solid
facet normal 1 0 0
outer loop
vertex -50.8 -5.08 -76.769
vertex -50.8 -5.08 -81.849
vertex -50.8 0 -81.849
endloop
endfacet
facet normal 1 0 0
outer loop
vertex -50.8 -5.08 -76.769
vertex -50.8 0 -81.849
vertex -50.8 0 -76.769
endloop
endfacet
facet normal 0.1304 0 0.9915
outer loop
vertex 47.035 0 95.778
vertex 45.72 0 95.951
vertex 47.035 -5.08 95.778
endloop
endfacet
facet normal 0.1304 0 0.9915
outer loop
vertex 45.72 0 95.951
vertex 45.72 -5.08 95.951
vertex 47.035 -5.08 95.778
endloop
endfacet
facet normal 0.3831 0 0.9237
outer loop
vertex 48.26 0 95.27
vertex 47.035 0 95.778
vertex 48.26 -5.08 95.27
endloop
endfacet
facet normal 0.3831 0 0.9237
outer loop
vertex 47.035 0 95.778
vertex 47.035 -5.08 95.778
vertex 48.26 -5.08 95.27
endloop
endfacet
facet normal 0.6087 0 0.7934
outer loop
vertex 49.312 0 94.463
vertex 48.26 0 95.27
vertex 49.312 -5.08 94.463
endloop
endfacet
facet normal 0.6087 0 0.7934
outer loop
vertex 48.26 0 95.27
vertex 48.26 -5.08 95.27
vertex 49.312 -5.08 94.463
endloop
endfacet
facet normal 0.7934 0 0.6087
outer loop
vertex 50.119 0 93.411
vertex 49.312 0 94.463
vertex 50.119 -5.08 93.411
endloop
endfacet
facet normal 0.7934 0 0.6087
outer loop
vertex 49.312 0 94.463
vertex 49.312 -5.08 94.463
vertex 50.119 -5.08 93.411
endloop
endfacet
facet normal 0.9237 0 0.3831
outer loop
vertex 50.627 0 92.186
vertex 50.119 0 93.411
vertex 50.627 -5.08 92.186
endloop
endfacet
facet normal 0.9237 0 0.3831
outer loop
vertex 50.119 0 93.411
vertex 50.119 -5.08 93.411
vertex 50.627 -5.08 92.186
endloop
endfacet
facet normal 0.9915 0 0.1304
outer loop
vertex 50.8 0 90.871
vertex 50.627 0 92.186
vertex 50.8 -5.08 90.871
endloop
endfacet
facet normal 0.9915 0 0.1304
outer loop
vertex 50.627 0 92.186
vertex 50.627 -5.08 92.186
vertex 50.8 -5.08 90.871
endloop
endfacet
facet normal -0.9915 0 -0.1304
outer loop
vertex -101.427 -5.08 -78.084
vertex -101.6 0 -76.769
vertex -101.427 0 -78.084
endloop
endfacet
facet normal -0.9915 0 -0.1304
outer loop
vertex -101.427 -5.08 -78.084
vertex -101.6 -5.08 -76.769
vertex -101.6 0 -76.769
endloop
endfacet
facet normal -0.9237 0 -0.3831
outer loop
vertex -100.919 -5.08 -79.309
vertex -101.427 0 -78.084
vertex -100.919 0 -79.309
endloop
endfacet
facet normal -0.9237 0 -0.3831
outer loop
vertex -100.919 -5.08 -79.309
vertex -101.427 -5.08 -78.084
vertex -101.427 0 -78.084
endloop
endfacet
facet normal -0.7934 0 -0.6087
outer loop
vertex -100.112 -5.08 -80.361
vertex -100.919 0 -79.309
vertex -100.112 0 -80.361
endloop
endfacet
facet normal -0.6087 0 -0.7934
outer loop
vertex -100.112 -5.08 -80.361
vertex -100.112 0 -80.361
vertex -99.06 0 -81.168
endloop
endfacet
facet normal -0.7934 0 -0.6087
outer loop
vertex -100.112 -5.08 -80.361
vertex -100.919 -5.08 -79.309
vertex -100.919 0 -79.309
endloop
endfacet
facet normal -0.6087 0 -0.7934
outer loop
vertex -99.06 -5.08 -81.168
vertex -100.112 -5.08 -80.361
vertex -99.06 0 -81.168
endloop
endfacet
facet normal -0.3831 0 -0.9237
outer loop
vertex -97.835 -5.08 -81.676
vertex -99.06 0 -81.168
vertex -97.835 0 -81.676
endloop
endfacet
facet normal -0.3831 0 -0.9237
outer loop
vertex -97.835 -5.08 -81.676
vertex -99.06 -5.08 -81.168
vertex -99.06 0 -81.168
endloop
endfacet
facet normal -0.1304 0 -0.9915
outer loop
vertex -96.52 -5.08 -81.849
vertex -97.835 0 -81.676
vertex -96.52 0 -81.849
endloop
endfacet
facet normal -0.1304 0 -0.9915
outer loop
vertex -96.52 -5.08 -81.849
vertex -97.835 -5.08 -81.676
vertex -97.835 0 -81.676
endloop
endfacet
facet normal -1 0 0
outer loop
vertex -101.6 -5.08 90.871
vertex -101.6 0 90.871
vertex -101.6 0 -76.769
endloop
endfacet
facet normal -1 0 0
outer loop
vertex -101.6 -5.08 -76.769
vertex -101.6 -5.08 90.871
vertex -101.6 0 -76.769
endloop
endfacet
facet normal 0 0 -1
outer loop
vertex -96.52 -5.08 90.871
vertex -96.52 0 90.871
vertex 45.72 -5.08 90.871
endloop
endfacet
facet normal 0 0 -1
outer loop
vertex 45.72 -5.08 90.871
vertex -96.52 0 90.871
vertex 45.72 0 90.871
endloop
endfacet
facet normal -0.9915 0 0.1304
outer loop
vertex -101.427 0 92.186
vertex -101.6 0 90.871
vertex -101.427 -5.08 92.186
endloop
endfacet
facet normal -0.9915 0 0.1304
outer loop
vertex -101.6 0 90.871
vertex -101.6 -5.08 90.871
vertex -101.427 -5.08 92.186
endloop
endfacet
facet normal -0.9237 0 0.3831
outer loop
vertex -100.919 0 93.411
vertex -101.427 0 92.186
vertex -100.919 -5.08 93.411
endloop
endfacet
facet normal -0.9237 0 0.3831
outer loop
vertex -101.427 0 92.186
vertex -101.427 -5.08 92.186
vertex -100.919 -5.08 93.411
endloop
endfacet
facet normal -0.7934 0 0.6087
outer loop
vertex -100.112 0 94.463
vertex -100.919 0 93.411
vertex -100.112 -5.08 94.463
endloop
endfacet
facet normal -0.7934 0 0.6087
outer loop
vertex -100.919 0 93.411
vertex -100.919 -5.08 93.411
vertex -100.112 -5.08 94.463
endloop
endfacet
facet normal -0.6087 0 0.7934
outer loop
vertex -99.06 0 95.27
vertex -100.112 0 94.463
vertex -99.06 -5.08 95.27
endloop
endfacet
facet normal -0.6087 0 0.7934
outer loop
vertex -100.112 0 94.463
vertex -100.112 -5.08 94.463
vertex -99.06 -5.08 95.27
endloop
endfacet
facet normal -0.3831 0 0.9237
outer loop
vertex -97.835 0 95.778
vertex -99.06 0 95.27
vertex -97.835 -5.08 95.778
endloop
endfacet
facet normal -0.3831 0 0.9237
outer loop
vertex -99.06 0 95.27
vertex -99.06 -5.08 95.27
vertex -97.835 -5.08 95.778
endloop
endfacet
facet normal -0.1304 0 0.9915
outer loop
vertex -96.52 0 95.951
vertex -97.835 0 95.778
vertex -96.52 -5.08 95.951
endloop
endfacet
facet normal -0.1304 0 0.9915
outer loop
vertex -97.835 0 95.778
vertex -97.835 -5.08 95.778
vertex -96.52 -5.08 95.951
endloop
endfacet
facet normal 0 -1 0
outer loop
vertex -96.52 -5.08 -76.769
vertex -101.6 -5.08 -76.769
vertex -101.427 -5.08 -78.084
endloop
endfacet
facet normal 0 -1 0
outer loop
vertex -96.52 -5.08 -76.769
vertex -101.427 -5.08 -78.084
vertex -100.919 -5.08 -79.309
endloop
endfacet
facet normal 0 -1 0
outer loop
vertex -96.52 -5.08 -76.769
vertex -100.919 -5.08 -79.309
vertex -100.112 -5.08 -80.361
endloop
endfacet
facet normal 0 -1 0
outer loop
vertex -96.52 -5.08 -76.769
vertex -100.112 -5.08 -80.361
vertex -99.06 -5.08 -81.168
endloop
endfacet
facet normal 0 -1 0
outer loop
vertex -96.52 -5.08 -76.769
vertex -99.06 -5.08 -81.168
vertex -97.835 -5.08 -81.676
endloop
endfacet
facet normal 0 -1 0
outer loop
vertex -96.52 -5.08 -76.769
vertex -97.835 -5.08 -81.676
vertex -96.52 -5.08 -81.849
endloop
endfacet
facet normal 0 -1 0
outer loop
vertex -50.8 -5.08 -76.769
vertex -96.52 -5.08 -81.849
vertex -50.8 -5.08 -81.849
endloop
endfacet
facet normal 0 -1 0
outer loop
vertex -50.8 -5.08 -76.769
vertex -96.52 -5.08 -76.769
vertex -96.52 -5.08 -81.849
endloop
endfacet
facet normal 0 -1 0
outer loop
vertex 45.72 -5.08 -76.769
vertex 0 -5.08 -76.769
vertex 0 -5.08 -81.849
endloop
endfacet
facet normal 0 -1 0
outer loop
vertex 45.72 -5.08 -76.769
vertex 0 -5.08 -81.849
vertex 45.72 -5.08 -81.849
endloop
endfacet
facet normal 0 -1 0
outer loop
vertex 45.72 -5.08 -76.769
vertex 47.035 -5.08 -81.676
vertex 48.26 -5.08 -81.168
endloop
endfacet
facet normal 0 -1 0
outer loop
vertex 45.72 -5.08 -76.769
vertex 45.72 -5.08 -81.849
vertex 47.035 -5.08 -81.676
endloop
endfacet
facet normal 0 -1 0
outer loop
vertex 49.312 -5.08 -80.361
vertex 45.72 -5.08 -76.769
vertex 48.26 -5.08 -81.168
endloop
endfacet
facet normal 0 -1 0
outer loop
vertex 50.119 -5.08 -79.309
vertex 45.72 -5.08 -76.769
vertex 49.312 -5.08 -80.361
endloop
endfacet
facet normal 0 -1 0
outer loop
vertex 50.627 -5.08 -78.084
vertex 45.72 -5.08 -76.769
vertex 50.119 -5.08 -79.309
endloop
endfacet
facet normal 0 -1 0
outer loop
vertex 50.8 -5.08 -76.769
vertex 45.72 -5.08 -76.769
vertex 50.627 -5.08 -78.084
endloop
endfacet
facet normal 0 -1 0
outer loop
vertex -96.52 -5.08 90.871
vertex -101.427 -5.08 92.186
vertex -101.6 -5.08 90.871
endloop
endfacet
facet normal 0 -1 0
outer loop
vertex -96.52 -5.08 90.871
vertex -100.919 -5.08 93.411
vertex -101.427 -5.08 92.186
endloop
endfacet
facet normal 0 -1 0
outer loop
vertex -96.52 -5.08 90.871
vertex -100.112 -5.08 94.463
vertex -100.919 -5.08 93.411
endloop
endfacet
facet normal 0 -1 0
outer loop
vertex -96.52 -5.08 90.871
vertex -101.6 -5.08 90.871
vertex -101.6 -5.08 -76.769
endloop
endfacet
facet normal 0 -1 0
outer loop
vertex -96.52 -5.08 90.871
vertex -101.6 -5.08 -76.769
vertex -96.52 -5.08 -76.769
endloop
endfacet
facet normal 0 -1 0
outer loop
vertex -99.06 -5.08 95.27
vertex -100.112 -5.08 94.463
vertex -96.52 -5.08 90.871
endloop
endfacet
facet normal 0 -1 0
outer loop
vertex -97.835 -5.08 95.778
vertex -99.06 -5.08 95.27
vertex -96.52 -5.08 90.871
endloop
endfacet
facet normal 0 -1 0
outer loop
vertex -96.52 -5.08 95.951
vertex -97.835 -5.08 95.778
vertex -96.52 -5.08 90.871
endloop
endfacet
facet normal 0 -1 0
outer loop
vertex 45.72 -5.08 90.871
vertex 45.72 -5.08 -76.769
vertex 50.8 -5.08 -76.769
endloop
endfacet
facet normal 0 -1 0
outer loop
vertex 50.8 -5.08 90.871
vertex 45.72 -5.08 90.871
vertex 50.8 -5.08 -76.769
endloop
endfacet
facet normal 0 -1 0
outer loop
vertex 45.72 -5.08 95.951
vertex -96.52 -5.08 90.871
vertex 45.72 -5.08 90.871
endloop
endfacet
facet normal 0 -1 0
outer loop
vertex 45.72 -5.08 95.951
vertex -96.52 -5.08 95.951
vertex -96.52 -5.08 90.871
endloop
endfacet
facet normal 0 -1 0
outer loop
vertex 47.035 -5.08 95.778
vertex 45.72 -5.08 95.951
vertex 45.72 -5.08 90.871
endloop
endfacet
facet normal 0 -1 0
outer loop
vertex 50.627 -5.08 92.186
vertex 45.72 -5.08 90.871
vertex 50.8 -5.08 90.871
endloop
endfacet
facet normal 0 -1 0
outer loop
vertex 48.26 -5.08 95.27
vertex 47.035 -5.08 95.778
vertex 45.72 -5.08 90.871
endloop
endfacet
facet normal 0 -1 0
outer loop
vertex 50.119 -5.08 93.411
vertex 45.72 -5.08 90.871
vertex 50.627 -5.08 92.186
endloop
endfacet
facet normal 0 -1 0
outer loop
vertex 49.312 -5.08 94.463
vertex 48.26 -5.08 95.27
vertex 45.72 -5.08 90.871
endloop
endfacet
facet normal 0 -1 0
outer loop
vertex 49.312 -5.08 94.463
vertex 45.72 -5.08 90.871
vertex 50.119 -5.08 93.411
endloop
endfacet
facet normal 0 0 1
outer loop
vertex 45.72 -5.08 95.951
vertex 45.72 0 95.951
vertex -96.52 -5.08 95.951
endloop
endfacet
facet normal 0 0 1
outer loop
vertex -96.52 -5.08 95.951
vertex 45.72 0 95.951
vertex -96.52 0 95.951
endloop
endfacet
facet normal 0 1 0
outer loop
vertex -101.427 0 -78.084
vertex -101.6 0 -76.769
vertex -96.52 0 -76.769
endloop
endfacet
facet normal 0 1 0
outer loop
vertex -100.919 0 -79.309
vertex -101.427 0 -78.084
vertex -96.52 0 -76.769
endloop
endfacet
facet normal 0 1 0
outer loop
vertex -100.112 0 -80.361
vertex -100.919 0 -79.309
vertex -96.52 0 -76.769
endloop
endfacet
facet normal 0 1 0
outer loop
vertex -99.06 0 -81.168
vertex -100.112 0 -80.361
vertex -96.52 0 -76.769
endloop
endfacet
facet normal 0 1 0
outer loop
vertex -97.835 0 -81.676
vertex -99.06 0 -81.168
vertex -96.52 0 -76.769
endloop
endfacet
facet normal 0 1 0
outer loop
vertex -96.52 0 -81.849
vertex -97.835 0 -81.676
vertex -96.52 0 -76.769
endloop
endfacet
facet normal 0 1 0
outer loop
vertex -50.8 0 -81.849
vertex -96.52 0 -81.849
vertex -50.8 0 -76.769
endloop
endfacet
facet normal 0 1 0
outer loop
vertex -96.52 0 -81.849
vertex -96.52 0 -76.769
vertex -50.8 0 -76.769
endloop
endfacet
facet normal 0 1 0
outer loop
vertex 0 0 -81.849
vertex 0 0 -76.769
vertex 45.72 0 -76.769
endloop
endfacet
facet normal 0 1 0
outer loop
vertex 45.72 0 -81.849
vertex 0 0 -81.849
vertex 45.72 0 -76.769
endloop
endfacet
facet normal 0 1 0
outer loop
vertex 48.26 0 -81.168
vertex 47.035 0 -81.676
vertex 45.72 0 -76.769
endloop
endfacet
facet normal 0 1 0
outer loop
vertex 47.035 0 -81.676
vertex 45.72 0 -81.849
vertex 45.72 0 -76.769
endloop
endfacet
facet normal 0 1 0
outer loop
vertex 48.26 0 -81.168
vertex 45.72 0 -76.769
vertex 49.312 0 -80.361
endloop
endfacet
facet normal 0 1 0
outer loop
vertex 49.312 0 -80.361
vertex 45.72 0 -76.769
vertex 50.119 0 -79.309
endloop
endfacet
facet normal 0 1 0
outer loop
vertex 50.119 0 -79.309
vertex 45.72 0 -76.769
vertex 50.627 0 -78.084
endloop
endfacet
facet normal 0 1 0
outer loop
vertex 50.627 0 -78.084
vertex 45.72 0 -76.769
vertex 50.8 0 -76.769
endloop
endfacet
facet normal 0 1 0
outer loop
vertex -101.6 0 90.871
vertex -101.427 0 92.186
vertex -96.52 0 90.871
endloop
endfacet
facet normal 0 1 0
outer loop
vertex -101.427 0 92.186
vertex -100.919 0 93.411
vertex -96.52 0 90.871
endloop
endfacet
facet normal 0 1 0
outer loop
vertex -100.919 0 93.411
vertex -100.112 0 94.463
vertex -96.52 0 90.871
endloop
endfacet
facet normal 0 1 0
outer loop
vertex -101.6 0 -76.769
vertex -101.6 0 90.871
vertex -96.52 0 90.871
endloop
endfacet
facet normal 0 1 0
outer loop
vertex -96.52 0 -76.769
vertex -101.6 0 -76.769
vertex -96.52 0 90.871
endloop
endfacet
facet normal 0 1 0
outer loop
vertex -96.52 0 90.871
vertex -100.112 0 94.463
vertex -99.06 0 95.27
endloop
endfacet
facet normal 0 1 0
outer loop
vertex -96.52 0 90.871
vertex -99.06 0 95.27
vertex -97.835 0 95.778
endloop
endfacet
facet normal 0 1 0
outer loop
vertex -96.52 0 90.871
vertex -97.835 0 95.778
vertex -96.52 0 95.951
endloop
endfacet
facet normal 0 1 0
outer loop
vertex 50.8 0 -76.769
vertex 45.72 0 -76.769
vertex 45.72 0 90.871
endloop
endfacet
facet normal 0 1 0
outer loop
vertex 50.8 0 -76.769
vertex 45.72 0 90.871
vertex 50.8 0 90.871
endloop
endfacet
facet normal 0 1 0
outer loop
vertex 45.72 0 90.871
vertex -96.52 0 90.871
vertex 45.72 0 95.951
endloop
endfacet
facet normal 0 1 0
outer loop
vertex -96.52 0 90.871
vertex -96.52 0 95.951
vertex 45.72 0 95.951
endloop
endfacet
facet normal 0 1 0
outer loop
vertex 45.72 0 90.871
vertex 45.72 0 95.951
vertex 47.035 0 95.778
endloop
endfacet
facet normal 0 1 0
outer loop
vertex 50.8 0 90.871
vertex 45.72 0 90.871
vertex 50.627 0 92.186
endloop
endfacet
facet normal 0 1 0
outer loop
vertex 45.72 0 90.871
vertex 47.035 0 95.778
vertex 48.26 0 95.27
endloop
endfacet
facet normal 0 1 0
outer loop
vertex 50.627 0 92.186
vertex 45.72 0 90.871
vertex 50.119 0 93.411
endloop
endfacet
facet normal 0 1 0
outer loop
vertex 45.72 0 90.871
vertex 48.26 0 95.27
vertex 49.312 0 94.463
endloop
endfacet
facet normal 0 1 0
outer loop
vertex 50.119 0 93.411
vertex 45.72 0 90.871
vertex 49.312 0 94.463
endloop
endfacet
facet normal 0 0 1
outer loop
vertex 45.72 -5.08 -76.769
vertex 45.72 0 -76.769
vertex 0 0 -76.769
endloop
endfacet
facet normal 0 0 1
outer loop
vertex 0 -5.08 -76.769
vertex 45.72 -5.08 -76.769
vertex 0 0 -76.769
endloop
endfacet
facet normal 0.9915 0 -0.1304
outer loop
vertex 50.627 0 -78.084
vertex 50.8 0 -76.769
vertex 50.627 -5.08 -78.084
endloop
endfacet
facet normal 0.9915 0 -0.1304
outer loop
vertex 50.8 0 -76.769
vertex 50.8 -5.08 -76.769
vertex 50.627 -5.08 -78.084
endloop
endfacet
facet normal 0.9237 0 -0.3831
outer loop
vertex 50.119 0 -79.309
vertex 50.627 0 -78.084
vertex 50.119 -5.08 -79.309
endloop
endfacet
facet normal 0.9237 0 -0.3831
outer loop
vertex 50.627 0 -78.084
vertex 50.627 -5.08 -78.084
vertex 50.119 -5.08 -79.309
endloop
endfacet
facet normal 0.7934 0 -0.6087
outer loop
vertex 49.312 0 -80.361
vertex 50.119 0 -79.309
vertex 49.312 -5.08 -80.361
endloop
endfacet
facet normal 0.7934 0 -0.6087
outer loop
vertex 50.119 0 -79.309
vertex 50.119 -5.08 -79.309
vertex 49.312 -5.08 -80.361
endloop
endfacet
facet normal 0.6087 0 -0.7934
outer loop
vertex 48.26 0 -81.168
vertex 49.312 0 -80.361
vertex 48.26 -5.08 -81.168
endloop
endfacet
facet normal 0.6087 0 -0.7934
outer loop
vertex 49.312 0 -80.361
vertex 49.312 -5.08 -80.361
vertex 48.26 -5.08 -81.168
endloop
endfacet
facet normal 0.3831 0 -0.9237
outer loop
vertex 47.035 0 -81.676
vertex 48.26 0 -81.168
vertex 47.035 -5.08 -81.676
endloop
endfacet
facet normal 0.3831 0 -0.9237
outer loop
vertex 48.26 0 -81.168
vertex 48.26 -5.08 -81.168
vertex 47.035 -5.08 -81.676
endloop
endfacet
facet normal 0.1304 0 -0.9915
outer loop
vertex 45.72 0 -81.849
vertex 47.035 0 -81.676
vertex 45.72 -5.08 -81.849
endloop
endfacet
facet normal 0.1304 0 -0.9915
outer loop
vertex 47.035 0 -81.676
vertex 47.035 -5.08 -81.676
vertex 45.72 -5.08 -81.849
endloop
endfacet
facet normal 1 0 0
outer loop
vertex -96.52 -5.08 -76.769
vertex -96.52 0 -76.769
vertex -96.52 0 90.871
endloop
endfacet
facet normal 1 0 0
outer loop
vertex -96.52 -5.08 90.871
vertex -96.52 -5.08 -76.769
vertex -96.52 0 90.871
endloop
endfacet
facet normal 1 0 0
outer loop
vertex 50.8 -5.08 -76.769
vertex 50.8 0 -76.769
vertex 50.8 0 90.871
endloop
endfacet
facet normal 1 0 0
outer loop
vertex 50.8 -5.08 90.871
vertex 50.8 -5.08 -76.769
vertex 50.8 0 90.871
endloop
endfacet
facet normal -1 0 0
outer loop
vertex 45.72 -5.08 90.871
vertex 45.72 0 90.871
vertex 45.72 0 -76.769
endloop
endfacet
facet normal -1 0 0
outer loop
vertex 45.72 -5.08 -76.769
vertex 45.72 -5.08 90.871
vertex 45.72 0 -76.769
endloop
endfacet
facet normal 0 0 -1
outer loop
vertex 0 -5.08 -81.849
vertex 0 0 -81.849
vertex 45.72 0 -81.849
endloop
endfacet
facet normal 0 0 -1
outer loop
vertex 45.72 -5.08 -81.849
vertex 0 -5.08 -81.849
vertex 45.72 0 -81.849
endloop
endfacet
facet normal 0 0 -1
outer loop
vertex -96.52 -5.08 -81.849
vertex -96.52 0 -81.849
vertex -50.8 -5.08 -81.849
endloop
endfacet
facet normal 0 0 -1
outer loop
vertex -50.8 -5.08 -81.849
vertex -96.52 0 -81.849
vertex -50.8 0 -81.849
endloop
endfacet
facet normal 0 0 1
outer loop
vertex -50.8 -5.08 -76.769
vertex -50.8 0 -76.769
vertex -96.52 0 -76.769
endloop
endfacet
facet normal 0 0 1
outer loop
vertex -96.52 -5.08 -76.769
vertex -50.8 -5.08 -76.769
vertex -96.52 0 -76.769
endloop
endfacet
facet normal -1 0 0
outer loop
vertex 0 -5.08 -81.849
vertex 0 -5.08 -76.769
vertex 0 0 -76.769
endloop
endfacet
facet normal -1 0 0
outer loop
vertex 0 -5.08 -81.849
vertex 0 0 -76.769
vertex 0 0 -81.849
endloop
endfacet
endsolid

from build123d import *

# Parameters (mm, degrees)
F1_DEPTH = 5.08
F2_R     = 5.08
F3_R     = 5.08
F4_R     = 5.08
F5_R     = 5.08


with BuildPart() as f1:
    # F0 (on Front) → F1 (new body)
    with BuildSketch(Plane.XZ):
        Polygon((-101.6, 95.951064), (-101.6, -81.848936), (-50.8, -81.848936), (-50.8, -76.768936), (-96.52, -76.768936), (-96.52, 90.871064), (45.72, 90.871064), (45.72, -76.768936), (0, -76.768936), (0, -81.848936), (50.8, -81.848936), (50.8, 95.951064), align=None)
    extrude(amount=F1_DEPTH)

    # F2
    f2_edges = [f1.edges().sort_by_distance(p)[0] for p in [
        (-101.6, -2.54, 95.951064),
    ]]
    fillet(f2_edges, radius=F2_R)

    # F3
    f3_edges = [f1.edges().sort_by_distance(p)[0] for p in [
        (50.8, -2.54, 95.951064),
    ]]
    fillet(f3_edges, radius=F3_R)

    # F4
    f4_edges = [f1.edges().sort_by_distance(p)[0] for p in [
        (-101.6, -2.54, -81.848936),
    ]]
    fillet(f4_edges, radius=F4_R)

    # F5
    f5_edges = [f1.edges().sort_by_distance(p)[0] for p in [
        (50.8, -2.54, -81.848936),
    ]]
    fillet(f5_edges, radius=F5_R)


solid = f1.part
